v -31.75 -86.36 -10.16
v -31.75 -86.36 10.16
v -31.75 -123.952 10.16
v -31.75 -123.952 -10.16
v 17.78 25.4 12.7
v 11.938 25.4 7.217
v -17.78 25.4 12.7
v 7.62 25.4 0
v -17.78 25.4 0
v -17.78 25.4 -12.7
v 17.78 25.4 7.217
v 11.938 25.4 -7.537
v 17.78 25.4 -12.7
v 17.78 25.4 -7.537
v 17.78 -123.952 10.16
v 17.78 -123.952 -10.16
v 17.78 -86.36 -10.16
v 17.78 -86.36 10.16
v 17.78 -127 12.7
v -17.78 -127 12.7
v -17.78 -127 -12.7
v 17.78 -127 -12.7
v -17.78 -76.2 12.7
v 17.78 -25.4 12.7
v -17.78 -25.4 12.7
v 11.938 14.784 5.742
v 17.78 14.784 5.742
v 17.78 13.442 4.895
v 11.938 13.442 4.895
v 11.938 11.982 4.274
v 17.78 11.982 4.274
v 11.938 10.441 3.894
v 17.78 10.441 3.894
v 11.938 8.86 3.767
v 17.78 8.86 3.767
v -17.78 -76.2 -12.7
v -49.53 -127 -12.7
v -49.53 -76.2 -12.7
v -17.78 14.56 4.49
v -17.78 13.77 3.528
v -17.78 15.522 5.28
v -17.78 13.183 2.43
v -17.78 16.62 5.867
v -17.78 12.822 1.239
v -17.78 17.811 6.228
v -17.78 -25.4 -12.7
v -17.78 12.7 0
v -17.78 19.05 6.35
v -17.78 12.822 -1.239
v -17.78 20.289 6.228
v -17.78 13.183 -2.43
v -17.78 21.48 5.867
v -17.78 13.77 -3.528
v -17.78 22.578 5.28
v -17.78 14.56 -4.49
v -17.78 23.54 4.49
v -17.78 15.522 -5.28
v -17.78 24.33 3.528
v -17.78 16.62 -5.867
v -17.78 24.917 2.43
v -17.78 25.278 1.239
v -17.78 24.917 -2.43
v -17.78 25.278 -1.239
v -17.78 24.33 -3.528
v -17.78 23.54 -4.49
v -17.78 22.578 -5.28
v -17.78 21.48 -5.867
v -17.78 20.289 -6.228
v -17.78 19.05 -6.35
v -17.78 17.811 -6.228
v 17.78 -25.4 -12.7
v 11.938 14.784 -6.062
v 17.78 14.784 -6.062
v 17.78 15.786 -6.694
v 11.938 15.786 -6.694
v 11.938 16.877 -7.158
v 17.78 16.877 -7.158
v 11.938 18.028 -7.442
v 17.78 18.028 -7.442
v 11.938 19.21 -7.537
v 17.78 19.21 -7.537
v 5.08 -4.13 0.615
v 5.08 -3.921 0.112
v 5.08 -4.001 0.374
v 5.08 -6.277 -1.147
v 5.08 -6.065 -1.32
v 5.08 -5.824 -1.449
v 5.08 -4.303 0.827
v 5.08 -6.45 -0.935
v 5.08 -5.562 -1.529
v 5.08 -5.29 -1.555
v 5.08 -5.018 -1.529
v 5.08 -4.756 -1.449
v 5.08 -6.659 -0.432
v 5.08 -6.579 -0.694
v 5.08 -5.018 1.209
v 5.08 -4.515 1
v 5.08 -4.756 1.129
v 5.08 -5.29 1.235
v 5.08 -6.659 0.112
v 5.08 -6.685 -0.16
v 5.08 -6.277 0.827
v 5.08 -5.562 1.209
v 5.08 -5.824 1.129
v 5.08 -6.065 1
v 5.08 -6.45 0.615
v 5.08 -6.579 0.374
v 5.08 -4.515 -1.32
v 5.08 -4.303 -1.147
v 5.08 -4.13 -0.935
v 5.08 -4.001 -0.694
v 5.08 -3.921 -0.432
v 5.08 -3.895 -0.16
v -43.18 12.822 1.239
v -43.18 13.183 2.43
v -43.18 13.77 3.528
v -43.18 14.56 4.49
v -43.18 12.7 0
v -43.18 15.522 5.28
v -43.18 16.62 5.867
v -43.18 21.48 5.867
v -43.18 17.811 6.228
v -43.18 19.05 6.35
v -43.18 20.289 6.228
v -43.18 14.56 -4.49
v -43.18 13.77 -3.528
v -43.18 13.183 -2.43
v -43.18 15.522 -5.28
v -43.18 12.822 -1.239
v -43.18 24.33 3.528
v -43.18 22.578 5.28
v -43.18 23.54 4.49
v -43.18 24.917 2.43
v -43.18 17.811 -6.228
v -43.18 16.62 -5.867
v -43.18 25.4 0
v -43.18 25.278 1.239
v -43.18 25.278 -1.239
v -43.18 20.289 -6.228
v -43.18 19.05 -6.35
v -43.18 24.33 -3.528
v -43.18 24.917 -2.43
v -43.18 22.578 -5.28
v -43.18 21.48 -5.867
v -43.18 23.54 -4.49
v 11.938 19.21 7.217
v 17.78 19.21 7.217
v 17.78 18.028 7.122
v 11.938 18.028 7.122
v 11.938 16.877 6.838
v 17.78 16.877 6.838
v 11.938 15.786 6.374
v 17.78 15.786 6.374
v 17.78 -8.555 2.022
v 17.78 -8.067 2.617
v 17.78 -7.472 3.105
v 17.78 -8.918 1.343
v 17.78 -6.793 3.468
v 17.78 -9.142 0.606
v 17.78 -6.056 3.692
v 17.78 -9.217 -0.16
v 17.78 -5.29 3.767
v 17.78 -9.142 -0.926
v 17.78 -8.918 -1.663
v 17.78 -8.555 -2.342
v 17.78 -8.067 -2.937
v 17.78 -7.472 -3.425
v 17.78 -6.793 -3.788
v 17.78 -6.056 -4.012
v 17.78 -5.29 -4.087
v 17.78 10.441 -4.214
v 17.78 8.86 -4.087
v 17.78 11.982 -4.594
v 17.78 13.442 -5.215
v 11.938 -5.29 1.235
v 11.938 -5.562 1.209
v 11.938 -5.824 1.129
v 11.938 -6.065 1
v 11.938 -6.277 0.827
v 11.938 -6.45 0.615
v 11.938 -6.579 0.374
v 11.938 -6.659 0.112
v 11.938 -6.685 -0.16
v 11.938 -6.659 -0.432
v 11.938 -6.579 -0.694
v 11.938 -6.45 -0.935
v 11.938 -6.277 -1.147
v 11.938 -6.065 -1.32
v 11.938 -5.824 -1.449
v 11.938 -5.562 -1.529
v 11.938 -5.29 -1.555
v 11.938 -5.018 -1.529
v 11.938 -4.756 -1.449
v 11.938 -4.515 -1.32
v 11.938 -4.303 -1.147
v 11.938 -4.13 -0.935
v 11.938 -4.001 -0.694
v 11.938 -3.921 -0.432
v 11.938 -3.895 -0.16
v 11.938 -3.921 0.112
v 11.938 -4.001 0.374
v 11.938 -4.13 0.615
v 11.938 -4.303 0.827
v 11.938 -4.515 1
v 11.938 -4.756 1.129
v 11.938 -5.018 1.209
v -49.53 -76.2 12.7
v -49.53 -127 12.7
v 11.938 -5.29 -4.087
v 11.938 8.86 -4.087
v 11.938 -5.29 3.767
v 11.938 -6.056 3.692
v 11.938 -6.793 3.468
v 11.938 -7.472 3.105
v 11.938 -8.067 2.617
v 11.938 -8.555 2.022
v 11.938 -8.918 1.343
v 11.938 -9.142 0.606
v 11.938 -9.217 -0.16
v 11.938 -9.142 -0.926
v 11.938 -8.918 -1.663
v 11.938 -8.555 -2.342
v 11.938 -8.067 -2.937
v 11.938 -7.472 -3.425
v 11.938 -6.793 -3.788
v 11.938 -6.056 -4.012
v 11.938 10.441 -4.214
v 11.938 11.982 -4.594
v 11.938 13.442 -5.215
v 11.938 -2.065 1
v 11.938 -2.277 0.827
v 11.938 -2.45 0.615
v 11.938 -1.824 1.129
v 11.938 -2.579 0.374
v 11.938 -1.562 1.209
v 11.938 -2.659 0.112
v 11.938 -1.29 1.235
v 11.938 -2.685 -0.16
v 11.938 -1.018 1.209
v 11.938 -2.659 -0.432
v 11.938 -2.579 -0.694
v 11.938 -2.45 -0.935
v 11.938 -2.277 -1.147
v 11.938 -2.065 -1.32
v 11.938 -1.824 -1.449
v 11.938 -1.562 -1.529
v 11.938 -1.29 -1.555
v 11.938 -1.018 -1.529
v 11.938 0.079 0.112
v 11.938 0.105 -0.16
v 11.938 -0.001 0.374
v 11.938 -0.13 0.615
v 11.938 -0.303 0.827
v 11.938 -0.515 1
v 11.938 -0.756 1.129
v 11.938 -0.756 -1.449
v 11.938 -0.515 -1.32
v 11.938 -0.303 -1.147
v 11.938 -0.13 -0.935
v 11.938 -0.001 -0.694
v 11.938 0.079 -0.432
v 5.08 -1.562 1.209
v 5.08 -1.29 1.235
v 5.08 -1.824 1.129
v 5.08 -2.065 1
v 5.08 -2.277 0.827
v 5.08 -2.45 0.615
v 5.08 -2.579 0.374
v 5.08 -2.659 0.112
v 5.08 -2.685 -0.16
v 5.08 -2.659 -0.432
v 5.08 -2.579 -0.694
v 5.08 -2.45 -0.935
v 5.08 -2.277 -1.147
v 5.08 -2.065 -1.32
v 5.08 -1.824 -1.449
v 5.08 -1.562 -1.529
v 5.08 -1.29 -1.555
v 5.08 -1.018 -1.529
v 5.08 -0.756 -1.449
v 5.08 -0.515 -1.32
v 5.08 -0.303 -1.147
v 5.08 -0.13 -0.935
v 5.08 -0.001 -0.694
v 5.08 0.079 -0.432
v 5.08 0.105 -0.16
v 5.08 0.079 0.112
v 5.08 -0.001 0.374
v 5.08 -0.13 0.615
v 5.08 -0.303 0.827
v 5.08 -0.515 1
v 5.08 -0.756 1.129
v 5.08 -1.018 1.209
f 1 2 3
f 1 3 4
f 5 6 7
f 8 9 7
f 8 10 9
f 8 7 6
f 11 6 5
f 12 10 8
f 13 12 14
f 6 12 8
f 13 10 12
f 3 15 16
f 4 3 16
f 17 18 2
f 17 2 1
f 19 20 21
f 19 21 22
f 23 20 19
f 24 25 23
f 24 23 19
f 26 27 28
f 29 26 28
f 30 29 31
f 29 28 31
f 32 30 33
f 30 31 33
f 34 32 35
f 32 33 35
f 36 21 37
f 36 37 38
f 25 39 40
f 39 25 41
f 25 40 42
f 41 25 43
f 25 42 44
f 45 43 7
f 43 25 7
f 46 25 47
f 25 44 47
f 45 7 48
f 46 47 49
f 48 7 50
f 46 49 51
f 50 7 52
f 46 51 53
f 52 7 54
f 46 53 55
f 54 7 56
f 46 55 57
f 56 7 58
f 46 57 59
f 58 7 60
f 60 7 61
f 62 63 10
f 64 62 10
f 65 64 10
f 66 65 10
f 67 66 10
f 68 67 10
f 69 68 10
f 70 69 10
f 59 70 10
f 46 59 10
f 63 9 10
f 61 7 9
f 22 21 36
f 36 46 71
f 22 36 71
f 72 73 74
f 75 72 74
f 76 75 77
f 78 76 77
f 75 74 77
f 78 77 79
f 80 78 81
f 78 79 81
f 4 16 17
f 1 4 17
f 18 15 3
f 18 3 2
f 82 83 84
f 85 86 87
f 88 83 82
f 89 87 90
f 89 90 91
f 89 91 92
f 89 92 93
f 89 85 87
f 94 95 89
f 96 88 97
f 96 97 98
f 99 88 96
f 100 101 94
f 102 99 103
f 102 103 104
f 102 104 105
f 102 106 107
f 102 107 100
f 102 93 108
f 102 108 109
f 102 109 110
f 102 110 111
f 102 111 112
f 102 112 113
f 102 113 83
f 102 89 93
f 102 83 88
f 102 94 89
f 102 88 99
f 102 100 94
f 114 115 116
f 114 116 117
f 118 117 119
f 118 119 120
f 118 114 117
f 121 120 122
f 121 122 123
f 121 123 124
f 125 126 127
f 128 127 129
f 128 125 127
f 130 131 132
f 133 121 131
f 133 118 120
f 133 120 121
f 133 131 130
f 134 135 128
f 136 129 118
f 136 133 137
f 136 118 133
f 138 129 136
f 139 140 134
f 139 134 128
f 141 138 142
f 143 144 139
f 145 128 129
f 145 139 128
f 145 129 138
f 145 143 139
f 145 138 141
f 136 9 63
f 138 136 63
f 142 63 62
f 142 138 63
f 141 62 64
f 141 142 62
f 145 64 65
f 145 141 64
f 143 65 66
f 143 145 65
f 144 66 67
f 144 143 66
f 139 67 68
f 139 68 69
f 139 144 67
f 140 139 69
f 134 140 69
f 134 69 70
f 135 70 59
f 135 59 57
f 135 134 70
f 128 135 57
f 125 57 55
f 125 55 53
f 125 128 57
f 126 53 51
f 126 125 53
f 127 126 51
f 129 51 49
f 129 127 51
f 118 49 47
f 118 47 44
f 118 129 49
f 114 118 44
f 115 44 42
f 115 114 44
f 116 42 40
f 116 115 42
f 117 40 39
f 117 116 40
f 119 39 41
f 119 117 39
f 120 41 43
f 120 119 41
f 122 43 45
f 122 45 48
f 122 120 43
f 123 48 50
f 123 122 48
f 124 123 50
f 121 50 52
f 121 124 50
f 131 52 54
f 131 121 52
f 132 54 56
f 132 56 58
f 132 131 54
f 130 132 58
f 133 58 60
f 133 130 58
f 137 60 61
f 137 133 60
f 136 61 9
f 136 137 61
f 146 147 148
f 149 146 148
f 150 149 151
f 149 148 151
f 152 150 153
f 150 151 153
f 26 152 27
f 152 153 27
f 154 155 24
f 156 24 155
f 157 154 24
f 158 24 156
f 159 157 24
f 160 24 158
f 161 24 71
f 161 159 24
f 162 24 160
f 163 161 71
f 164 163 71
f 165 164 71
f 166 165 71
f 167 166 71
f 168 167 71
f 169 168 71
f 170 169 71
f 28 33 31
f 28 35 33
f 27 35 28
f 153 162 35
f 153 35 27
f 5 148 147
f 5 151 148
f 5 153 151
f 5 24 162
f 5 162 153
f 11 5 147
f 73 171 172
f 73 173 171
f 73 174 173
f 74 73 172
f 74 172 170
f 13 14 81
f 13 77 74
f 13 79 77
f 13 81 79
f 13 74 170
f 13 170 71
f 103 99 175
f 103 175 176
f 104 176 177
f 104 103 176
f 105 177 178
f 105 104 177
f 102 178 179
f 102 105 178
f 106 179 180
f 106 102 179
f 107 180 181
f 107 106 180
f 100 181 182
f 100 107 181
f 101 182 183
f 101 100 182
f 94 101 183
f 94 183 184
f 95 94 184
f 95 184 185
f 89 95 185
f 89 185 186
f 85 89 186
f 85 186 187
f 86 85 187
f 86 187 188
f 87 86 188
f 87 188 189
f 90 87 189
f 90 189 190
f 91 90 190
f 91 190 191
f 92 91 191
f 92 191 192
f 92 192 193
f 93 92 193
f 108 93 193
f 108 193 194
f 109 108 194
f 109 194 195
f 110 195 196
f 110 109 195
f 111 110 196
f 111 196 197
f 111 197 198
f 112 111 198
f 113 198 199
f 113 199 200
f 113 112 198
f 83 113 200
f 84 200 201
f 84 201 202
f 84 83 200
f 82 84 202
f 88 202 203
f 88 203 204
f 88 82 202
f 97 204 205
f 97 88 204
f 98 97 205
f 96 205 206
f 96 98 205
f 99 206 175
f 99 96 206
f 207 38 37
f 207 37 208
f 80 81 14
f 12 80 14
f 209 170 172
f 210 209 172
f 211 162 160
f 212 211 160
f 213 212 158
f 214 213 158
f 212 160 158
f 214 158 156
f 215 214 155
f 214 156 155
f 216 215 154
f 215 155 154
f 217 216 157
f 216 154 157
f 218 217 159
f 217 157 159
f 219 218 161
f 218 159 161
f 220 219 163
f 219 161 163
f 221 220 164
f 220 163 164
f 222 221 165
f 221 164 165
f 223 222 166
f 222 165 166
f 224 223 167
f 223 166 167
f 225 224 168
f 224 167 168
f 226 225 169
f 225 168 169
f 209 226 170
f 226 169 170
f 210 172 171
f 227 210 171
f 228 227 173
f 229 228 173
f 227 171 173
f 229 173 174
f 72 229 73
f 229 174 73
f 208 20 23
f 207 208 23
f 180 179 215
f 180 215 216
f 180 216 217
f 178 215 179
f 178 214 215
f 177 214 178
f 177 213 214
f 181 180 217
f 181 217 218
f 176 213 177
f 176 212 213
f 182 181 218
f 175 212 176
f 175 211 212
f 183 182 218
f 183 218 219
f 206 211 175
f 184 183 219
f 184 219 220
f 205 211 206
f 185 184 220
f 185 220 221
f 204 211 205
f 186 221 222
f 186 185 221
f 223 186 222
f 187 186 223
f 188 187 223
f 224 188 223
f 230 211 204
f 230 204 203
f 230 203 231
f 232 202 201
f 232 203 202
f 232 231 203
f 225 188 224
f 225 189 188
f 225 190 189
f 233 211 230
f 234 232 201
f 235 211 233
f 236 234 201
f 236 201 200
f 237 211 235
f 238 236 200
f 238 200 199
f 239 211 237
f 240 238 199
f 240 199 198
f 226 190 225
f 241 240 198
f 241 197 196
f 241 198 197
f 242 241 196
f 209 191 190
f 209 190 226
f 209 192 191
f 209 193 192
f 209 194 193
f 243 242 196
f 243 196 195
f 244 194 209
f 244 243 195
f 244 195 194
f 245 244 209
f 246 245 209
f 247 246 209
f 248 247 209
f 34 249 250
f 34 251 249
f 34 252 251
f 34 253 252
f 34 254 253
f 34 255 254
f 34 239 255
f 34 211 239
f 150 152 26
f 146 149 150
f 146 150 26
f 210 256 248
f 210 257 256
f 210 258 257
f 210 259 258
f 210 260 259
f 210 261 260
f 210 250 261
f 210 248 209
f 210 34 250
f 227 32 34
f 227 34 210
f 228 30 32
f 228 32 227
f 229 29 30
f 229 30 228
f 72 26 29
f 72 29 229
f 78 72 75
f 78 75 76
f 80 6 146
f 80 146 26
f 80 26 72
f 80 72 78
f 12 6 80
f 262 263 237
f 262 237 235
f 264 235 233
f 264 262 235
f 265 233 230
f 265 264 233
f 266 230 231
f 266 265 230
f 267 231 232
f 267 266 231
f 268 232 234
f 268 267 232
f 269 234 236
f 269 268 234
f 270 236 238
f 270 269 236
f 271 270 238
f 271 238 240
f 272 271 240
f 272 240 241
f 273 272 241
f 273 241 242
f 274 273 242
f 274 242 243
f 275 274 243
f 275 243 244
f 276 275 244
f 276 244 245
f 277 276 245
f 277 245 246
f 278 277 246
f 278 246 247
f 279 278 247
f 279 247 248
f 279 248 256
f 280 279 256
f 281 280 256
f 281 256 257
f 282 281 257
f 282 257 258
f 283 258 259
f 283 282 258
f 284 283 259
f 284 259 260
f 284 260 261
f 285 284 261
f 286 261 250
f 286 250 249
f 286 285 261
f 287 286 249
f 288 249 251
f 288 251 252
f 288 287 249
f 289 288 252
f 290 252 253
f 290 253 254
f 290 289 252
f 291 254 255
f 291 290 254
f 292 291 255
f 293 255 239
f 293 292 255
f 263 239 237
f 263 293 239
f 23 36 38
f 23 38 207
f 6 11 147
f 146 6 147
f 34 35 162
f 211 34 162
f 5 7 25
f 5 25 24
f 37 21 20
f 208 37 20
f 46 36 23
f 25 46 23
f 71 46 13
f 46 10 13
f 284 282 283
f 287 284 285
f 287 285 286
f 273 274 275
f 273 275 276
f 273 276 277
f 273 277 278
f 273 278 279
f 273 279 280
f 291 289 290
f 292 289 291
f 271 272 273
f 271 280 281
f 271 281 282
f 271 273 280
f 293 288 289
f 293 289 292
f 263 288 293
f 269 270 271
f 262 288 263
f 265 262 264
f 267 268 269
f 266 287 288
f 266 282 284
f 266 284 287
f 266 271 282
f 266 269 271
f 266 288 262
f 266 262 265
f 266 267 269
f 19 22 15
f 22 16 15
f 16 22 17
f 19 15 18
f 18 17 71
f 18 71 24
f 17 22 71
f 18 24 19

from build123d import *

# Parameters (mm, degrees)
SKETCH1_W               = 35.56
SKETCH1_H               = 25.4
BOSS_EXTRUDE1_DEPTH     = 25.4
SKETCH2_R               = 6.35
BOSS_EXTRUDE2_DEPTH     = 25.4
SKETCH4_R               = 1.395358984
CUT_EXTRUDE1_DEPTH      = 5.842
SKETCH7_W               = 35.56
SKETCH7_H               = 25.4
BOSS_EXTRUDE3_DEPTH     = 101.6
CUT_EXTRUDE2_DEPTH      = 142.44402285
CUT_EXTRUDE2_DEPTH_BACK = 12.7
SKETCH4_4_R             = 1.395358984
SKETCH10_W              = 25.4
SKETCH10_H              = 50.8
BOSS_EXTRUDE4_DEPTH     = 31.75
SKETCH11_W              = 20.32
SKETCH11_H              = 37.592
CUT_EXTRUDE3_DEPTH      = 49.53


with BuildPart() as part:
    # Sketch1 → Boss-Extrude1 (new, symmetric)
    with BuildSketch(Plane(origin=(0, 0, 0), x_dir=(1, 0, 0), z_dir=(0, 1, 0))):
        Rectangle(SKETCH1_W, SKETCH1_H)
    extrude(amount=BOSS_EXTRUDE1_DEPTH, both=True)

    # Sketch2 → Boss-Extrude2 (add, symmetric)
    with BuildSketch(Plane.ZY.offset(17.78)):
        with Locations((0, 19.05)):
            Circle(SKETCH2_R)
    extrude(amount=BOSS_EXTRUDE2_DEPTH, both=True)

    # Sketch4 → Cut-Extrude1 (cut)
    with BuildSketch(Plane(origin=(17.78, 0, 0), x_dir=(0, 0, -1), z_dir=(1, 0, 0))):
        with BuildLine():
            ThreePointArc((-5.7416, 14.7838), (-4.273649798, 11.982116734), (-3.767, 8.86))
            Line((-3.767, 8.86), (-3.767, -5.29))
            ThreePointArc((-3.767, -5.29), (0.16, -9.217), (4.087, -5.29))
            Line((4.087, -5.29), (4.087, 8.86))
            ThreePointArc((4.087, 8.86), (4.593649798, 11.982116734), (6.0616, 14.7838))
            ThreePointArc((6.0616, 14.7838), (7.15843669, 16.87718777), (7.537, 19.21))
            Line((7.537, 19.21), (7.537, 26.587))
            Line((7.537, 26.587), (-7.217, 26.587))
            Line((-7.217, 26.587), (-7.217, 19.21))
            ThreePointArc((-7.217, 19.21), (-6.83843669, 16.87718777), (-5.7416, 14.7838))
        make_face()
        with Locations((0.16, -5.29)):
            Circle(SKETCH4_R, mode=Mode.SUBTRACT)
        with Locations((0.16, -1.29)):
            Circle(SKETCH4_R, mode=Mode.SUBTRACT)
    extrude(amount=-CUT_EXTRUDE1_DEPTH, mode=Mode.SUBTRACT)

    # Sketch7 → Boss-Extrude3 (add)
    with BuildSketch(Plane.XZ.offset(25.4)):
        Rectangle(SKETCH7_W, SKETCH7_H)
    extrude(amount=BOSS_EXTRUDE3_DEPTH)

    # Sketch4<4> → Cut-Extrude2 (cut, two sides: drawn at the far end of the back side and taken through both)
    with BuildSketch(Plane(origin=(17.78, 0, 0), x_dir=(0, 0, -1), z_dir=(1, 0, 0)).offset(-CUT_EXTRUDE2_DEPTH_BACK)):
        with Locations((0.16, -1.29)):
            Circle(SKETCH4_4_R)
        with Locations((0.16, -5.29)):
            Circle(SKETCH4_4_R)
    extrude(amount=CUT_EXTRUDE2_DEPTH + CUT_EXTRUDE2_DEPTH_BACK, mode=Mode.SUBTRACT)

    # Sketch10 → Boss-Extrude4 (add)
    with BuildSketch(Plane.ZY.offset(17.78)):
        with Locations((0, -101.6)):
            Rectangle(SKETCH10_W, SKETCH10_H)
    extrude(amount=BOSS_EXTRUDE4_DEPTH)

    # Sketch11 → Cut-Extrude3 (cut)
    with BuildSketch(Plane(origin=(17.78, 0, 0), x_dir=(0, 0, -1), z_dir=(1, 0, 0))):
        with Locations((0, -105.156)):
            Rectangle(SKETCH11_W, SKETCH11_H)
    extrude(amount=-CUT_EXTRUDE3_DEPTH, mode=Mode.SUBTRACT)


solid = part.part
